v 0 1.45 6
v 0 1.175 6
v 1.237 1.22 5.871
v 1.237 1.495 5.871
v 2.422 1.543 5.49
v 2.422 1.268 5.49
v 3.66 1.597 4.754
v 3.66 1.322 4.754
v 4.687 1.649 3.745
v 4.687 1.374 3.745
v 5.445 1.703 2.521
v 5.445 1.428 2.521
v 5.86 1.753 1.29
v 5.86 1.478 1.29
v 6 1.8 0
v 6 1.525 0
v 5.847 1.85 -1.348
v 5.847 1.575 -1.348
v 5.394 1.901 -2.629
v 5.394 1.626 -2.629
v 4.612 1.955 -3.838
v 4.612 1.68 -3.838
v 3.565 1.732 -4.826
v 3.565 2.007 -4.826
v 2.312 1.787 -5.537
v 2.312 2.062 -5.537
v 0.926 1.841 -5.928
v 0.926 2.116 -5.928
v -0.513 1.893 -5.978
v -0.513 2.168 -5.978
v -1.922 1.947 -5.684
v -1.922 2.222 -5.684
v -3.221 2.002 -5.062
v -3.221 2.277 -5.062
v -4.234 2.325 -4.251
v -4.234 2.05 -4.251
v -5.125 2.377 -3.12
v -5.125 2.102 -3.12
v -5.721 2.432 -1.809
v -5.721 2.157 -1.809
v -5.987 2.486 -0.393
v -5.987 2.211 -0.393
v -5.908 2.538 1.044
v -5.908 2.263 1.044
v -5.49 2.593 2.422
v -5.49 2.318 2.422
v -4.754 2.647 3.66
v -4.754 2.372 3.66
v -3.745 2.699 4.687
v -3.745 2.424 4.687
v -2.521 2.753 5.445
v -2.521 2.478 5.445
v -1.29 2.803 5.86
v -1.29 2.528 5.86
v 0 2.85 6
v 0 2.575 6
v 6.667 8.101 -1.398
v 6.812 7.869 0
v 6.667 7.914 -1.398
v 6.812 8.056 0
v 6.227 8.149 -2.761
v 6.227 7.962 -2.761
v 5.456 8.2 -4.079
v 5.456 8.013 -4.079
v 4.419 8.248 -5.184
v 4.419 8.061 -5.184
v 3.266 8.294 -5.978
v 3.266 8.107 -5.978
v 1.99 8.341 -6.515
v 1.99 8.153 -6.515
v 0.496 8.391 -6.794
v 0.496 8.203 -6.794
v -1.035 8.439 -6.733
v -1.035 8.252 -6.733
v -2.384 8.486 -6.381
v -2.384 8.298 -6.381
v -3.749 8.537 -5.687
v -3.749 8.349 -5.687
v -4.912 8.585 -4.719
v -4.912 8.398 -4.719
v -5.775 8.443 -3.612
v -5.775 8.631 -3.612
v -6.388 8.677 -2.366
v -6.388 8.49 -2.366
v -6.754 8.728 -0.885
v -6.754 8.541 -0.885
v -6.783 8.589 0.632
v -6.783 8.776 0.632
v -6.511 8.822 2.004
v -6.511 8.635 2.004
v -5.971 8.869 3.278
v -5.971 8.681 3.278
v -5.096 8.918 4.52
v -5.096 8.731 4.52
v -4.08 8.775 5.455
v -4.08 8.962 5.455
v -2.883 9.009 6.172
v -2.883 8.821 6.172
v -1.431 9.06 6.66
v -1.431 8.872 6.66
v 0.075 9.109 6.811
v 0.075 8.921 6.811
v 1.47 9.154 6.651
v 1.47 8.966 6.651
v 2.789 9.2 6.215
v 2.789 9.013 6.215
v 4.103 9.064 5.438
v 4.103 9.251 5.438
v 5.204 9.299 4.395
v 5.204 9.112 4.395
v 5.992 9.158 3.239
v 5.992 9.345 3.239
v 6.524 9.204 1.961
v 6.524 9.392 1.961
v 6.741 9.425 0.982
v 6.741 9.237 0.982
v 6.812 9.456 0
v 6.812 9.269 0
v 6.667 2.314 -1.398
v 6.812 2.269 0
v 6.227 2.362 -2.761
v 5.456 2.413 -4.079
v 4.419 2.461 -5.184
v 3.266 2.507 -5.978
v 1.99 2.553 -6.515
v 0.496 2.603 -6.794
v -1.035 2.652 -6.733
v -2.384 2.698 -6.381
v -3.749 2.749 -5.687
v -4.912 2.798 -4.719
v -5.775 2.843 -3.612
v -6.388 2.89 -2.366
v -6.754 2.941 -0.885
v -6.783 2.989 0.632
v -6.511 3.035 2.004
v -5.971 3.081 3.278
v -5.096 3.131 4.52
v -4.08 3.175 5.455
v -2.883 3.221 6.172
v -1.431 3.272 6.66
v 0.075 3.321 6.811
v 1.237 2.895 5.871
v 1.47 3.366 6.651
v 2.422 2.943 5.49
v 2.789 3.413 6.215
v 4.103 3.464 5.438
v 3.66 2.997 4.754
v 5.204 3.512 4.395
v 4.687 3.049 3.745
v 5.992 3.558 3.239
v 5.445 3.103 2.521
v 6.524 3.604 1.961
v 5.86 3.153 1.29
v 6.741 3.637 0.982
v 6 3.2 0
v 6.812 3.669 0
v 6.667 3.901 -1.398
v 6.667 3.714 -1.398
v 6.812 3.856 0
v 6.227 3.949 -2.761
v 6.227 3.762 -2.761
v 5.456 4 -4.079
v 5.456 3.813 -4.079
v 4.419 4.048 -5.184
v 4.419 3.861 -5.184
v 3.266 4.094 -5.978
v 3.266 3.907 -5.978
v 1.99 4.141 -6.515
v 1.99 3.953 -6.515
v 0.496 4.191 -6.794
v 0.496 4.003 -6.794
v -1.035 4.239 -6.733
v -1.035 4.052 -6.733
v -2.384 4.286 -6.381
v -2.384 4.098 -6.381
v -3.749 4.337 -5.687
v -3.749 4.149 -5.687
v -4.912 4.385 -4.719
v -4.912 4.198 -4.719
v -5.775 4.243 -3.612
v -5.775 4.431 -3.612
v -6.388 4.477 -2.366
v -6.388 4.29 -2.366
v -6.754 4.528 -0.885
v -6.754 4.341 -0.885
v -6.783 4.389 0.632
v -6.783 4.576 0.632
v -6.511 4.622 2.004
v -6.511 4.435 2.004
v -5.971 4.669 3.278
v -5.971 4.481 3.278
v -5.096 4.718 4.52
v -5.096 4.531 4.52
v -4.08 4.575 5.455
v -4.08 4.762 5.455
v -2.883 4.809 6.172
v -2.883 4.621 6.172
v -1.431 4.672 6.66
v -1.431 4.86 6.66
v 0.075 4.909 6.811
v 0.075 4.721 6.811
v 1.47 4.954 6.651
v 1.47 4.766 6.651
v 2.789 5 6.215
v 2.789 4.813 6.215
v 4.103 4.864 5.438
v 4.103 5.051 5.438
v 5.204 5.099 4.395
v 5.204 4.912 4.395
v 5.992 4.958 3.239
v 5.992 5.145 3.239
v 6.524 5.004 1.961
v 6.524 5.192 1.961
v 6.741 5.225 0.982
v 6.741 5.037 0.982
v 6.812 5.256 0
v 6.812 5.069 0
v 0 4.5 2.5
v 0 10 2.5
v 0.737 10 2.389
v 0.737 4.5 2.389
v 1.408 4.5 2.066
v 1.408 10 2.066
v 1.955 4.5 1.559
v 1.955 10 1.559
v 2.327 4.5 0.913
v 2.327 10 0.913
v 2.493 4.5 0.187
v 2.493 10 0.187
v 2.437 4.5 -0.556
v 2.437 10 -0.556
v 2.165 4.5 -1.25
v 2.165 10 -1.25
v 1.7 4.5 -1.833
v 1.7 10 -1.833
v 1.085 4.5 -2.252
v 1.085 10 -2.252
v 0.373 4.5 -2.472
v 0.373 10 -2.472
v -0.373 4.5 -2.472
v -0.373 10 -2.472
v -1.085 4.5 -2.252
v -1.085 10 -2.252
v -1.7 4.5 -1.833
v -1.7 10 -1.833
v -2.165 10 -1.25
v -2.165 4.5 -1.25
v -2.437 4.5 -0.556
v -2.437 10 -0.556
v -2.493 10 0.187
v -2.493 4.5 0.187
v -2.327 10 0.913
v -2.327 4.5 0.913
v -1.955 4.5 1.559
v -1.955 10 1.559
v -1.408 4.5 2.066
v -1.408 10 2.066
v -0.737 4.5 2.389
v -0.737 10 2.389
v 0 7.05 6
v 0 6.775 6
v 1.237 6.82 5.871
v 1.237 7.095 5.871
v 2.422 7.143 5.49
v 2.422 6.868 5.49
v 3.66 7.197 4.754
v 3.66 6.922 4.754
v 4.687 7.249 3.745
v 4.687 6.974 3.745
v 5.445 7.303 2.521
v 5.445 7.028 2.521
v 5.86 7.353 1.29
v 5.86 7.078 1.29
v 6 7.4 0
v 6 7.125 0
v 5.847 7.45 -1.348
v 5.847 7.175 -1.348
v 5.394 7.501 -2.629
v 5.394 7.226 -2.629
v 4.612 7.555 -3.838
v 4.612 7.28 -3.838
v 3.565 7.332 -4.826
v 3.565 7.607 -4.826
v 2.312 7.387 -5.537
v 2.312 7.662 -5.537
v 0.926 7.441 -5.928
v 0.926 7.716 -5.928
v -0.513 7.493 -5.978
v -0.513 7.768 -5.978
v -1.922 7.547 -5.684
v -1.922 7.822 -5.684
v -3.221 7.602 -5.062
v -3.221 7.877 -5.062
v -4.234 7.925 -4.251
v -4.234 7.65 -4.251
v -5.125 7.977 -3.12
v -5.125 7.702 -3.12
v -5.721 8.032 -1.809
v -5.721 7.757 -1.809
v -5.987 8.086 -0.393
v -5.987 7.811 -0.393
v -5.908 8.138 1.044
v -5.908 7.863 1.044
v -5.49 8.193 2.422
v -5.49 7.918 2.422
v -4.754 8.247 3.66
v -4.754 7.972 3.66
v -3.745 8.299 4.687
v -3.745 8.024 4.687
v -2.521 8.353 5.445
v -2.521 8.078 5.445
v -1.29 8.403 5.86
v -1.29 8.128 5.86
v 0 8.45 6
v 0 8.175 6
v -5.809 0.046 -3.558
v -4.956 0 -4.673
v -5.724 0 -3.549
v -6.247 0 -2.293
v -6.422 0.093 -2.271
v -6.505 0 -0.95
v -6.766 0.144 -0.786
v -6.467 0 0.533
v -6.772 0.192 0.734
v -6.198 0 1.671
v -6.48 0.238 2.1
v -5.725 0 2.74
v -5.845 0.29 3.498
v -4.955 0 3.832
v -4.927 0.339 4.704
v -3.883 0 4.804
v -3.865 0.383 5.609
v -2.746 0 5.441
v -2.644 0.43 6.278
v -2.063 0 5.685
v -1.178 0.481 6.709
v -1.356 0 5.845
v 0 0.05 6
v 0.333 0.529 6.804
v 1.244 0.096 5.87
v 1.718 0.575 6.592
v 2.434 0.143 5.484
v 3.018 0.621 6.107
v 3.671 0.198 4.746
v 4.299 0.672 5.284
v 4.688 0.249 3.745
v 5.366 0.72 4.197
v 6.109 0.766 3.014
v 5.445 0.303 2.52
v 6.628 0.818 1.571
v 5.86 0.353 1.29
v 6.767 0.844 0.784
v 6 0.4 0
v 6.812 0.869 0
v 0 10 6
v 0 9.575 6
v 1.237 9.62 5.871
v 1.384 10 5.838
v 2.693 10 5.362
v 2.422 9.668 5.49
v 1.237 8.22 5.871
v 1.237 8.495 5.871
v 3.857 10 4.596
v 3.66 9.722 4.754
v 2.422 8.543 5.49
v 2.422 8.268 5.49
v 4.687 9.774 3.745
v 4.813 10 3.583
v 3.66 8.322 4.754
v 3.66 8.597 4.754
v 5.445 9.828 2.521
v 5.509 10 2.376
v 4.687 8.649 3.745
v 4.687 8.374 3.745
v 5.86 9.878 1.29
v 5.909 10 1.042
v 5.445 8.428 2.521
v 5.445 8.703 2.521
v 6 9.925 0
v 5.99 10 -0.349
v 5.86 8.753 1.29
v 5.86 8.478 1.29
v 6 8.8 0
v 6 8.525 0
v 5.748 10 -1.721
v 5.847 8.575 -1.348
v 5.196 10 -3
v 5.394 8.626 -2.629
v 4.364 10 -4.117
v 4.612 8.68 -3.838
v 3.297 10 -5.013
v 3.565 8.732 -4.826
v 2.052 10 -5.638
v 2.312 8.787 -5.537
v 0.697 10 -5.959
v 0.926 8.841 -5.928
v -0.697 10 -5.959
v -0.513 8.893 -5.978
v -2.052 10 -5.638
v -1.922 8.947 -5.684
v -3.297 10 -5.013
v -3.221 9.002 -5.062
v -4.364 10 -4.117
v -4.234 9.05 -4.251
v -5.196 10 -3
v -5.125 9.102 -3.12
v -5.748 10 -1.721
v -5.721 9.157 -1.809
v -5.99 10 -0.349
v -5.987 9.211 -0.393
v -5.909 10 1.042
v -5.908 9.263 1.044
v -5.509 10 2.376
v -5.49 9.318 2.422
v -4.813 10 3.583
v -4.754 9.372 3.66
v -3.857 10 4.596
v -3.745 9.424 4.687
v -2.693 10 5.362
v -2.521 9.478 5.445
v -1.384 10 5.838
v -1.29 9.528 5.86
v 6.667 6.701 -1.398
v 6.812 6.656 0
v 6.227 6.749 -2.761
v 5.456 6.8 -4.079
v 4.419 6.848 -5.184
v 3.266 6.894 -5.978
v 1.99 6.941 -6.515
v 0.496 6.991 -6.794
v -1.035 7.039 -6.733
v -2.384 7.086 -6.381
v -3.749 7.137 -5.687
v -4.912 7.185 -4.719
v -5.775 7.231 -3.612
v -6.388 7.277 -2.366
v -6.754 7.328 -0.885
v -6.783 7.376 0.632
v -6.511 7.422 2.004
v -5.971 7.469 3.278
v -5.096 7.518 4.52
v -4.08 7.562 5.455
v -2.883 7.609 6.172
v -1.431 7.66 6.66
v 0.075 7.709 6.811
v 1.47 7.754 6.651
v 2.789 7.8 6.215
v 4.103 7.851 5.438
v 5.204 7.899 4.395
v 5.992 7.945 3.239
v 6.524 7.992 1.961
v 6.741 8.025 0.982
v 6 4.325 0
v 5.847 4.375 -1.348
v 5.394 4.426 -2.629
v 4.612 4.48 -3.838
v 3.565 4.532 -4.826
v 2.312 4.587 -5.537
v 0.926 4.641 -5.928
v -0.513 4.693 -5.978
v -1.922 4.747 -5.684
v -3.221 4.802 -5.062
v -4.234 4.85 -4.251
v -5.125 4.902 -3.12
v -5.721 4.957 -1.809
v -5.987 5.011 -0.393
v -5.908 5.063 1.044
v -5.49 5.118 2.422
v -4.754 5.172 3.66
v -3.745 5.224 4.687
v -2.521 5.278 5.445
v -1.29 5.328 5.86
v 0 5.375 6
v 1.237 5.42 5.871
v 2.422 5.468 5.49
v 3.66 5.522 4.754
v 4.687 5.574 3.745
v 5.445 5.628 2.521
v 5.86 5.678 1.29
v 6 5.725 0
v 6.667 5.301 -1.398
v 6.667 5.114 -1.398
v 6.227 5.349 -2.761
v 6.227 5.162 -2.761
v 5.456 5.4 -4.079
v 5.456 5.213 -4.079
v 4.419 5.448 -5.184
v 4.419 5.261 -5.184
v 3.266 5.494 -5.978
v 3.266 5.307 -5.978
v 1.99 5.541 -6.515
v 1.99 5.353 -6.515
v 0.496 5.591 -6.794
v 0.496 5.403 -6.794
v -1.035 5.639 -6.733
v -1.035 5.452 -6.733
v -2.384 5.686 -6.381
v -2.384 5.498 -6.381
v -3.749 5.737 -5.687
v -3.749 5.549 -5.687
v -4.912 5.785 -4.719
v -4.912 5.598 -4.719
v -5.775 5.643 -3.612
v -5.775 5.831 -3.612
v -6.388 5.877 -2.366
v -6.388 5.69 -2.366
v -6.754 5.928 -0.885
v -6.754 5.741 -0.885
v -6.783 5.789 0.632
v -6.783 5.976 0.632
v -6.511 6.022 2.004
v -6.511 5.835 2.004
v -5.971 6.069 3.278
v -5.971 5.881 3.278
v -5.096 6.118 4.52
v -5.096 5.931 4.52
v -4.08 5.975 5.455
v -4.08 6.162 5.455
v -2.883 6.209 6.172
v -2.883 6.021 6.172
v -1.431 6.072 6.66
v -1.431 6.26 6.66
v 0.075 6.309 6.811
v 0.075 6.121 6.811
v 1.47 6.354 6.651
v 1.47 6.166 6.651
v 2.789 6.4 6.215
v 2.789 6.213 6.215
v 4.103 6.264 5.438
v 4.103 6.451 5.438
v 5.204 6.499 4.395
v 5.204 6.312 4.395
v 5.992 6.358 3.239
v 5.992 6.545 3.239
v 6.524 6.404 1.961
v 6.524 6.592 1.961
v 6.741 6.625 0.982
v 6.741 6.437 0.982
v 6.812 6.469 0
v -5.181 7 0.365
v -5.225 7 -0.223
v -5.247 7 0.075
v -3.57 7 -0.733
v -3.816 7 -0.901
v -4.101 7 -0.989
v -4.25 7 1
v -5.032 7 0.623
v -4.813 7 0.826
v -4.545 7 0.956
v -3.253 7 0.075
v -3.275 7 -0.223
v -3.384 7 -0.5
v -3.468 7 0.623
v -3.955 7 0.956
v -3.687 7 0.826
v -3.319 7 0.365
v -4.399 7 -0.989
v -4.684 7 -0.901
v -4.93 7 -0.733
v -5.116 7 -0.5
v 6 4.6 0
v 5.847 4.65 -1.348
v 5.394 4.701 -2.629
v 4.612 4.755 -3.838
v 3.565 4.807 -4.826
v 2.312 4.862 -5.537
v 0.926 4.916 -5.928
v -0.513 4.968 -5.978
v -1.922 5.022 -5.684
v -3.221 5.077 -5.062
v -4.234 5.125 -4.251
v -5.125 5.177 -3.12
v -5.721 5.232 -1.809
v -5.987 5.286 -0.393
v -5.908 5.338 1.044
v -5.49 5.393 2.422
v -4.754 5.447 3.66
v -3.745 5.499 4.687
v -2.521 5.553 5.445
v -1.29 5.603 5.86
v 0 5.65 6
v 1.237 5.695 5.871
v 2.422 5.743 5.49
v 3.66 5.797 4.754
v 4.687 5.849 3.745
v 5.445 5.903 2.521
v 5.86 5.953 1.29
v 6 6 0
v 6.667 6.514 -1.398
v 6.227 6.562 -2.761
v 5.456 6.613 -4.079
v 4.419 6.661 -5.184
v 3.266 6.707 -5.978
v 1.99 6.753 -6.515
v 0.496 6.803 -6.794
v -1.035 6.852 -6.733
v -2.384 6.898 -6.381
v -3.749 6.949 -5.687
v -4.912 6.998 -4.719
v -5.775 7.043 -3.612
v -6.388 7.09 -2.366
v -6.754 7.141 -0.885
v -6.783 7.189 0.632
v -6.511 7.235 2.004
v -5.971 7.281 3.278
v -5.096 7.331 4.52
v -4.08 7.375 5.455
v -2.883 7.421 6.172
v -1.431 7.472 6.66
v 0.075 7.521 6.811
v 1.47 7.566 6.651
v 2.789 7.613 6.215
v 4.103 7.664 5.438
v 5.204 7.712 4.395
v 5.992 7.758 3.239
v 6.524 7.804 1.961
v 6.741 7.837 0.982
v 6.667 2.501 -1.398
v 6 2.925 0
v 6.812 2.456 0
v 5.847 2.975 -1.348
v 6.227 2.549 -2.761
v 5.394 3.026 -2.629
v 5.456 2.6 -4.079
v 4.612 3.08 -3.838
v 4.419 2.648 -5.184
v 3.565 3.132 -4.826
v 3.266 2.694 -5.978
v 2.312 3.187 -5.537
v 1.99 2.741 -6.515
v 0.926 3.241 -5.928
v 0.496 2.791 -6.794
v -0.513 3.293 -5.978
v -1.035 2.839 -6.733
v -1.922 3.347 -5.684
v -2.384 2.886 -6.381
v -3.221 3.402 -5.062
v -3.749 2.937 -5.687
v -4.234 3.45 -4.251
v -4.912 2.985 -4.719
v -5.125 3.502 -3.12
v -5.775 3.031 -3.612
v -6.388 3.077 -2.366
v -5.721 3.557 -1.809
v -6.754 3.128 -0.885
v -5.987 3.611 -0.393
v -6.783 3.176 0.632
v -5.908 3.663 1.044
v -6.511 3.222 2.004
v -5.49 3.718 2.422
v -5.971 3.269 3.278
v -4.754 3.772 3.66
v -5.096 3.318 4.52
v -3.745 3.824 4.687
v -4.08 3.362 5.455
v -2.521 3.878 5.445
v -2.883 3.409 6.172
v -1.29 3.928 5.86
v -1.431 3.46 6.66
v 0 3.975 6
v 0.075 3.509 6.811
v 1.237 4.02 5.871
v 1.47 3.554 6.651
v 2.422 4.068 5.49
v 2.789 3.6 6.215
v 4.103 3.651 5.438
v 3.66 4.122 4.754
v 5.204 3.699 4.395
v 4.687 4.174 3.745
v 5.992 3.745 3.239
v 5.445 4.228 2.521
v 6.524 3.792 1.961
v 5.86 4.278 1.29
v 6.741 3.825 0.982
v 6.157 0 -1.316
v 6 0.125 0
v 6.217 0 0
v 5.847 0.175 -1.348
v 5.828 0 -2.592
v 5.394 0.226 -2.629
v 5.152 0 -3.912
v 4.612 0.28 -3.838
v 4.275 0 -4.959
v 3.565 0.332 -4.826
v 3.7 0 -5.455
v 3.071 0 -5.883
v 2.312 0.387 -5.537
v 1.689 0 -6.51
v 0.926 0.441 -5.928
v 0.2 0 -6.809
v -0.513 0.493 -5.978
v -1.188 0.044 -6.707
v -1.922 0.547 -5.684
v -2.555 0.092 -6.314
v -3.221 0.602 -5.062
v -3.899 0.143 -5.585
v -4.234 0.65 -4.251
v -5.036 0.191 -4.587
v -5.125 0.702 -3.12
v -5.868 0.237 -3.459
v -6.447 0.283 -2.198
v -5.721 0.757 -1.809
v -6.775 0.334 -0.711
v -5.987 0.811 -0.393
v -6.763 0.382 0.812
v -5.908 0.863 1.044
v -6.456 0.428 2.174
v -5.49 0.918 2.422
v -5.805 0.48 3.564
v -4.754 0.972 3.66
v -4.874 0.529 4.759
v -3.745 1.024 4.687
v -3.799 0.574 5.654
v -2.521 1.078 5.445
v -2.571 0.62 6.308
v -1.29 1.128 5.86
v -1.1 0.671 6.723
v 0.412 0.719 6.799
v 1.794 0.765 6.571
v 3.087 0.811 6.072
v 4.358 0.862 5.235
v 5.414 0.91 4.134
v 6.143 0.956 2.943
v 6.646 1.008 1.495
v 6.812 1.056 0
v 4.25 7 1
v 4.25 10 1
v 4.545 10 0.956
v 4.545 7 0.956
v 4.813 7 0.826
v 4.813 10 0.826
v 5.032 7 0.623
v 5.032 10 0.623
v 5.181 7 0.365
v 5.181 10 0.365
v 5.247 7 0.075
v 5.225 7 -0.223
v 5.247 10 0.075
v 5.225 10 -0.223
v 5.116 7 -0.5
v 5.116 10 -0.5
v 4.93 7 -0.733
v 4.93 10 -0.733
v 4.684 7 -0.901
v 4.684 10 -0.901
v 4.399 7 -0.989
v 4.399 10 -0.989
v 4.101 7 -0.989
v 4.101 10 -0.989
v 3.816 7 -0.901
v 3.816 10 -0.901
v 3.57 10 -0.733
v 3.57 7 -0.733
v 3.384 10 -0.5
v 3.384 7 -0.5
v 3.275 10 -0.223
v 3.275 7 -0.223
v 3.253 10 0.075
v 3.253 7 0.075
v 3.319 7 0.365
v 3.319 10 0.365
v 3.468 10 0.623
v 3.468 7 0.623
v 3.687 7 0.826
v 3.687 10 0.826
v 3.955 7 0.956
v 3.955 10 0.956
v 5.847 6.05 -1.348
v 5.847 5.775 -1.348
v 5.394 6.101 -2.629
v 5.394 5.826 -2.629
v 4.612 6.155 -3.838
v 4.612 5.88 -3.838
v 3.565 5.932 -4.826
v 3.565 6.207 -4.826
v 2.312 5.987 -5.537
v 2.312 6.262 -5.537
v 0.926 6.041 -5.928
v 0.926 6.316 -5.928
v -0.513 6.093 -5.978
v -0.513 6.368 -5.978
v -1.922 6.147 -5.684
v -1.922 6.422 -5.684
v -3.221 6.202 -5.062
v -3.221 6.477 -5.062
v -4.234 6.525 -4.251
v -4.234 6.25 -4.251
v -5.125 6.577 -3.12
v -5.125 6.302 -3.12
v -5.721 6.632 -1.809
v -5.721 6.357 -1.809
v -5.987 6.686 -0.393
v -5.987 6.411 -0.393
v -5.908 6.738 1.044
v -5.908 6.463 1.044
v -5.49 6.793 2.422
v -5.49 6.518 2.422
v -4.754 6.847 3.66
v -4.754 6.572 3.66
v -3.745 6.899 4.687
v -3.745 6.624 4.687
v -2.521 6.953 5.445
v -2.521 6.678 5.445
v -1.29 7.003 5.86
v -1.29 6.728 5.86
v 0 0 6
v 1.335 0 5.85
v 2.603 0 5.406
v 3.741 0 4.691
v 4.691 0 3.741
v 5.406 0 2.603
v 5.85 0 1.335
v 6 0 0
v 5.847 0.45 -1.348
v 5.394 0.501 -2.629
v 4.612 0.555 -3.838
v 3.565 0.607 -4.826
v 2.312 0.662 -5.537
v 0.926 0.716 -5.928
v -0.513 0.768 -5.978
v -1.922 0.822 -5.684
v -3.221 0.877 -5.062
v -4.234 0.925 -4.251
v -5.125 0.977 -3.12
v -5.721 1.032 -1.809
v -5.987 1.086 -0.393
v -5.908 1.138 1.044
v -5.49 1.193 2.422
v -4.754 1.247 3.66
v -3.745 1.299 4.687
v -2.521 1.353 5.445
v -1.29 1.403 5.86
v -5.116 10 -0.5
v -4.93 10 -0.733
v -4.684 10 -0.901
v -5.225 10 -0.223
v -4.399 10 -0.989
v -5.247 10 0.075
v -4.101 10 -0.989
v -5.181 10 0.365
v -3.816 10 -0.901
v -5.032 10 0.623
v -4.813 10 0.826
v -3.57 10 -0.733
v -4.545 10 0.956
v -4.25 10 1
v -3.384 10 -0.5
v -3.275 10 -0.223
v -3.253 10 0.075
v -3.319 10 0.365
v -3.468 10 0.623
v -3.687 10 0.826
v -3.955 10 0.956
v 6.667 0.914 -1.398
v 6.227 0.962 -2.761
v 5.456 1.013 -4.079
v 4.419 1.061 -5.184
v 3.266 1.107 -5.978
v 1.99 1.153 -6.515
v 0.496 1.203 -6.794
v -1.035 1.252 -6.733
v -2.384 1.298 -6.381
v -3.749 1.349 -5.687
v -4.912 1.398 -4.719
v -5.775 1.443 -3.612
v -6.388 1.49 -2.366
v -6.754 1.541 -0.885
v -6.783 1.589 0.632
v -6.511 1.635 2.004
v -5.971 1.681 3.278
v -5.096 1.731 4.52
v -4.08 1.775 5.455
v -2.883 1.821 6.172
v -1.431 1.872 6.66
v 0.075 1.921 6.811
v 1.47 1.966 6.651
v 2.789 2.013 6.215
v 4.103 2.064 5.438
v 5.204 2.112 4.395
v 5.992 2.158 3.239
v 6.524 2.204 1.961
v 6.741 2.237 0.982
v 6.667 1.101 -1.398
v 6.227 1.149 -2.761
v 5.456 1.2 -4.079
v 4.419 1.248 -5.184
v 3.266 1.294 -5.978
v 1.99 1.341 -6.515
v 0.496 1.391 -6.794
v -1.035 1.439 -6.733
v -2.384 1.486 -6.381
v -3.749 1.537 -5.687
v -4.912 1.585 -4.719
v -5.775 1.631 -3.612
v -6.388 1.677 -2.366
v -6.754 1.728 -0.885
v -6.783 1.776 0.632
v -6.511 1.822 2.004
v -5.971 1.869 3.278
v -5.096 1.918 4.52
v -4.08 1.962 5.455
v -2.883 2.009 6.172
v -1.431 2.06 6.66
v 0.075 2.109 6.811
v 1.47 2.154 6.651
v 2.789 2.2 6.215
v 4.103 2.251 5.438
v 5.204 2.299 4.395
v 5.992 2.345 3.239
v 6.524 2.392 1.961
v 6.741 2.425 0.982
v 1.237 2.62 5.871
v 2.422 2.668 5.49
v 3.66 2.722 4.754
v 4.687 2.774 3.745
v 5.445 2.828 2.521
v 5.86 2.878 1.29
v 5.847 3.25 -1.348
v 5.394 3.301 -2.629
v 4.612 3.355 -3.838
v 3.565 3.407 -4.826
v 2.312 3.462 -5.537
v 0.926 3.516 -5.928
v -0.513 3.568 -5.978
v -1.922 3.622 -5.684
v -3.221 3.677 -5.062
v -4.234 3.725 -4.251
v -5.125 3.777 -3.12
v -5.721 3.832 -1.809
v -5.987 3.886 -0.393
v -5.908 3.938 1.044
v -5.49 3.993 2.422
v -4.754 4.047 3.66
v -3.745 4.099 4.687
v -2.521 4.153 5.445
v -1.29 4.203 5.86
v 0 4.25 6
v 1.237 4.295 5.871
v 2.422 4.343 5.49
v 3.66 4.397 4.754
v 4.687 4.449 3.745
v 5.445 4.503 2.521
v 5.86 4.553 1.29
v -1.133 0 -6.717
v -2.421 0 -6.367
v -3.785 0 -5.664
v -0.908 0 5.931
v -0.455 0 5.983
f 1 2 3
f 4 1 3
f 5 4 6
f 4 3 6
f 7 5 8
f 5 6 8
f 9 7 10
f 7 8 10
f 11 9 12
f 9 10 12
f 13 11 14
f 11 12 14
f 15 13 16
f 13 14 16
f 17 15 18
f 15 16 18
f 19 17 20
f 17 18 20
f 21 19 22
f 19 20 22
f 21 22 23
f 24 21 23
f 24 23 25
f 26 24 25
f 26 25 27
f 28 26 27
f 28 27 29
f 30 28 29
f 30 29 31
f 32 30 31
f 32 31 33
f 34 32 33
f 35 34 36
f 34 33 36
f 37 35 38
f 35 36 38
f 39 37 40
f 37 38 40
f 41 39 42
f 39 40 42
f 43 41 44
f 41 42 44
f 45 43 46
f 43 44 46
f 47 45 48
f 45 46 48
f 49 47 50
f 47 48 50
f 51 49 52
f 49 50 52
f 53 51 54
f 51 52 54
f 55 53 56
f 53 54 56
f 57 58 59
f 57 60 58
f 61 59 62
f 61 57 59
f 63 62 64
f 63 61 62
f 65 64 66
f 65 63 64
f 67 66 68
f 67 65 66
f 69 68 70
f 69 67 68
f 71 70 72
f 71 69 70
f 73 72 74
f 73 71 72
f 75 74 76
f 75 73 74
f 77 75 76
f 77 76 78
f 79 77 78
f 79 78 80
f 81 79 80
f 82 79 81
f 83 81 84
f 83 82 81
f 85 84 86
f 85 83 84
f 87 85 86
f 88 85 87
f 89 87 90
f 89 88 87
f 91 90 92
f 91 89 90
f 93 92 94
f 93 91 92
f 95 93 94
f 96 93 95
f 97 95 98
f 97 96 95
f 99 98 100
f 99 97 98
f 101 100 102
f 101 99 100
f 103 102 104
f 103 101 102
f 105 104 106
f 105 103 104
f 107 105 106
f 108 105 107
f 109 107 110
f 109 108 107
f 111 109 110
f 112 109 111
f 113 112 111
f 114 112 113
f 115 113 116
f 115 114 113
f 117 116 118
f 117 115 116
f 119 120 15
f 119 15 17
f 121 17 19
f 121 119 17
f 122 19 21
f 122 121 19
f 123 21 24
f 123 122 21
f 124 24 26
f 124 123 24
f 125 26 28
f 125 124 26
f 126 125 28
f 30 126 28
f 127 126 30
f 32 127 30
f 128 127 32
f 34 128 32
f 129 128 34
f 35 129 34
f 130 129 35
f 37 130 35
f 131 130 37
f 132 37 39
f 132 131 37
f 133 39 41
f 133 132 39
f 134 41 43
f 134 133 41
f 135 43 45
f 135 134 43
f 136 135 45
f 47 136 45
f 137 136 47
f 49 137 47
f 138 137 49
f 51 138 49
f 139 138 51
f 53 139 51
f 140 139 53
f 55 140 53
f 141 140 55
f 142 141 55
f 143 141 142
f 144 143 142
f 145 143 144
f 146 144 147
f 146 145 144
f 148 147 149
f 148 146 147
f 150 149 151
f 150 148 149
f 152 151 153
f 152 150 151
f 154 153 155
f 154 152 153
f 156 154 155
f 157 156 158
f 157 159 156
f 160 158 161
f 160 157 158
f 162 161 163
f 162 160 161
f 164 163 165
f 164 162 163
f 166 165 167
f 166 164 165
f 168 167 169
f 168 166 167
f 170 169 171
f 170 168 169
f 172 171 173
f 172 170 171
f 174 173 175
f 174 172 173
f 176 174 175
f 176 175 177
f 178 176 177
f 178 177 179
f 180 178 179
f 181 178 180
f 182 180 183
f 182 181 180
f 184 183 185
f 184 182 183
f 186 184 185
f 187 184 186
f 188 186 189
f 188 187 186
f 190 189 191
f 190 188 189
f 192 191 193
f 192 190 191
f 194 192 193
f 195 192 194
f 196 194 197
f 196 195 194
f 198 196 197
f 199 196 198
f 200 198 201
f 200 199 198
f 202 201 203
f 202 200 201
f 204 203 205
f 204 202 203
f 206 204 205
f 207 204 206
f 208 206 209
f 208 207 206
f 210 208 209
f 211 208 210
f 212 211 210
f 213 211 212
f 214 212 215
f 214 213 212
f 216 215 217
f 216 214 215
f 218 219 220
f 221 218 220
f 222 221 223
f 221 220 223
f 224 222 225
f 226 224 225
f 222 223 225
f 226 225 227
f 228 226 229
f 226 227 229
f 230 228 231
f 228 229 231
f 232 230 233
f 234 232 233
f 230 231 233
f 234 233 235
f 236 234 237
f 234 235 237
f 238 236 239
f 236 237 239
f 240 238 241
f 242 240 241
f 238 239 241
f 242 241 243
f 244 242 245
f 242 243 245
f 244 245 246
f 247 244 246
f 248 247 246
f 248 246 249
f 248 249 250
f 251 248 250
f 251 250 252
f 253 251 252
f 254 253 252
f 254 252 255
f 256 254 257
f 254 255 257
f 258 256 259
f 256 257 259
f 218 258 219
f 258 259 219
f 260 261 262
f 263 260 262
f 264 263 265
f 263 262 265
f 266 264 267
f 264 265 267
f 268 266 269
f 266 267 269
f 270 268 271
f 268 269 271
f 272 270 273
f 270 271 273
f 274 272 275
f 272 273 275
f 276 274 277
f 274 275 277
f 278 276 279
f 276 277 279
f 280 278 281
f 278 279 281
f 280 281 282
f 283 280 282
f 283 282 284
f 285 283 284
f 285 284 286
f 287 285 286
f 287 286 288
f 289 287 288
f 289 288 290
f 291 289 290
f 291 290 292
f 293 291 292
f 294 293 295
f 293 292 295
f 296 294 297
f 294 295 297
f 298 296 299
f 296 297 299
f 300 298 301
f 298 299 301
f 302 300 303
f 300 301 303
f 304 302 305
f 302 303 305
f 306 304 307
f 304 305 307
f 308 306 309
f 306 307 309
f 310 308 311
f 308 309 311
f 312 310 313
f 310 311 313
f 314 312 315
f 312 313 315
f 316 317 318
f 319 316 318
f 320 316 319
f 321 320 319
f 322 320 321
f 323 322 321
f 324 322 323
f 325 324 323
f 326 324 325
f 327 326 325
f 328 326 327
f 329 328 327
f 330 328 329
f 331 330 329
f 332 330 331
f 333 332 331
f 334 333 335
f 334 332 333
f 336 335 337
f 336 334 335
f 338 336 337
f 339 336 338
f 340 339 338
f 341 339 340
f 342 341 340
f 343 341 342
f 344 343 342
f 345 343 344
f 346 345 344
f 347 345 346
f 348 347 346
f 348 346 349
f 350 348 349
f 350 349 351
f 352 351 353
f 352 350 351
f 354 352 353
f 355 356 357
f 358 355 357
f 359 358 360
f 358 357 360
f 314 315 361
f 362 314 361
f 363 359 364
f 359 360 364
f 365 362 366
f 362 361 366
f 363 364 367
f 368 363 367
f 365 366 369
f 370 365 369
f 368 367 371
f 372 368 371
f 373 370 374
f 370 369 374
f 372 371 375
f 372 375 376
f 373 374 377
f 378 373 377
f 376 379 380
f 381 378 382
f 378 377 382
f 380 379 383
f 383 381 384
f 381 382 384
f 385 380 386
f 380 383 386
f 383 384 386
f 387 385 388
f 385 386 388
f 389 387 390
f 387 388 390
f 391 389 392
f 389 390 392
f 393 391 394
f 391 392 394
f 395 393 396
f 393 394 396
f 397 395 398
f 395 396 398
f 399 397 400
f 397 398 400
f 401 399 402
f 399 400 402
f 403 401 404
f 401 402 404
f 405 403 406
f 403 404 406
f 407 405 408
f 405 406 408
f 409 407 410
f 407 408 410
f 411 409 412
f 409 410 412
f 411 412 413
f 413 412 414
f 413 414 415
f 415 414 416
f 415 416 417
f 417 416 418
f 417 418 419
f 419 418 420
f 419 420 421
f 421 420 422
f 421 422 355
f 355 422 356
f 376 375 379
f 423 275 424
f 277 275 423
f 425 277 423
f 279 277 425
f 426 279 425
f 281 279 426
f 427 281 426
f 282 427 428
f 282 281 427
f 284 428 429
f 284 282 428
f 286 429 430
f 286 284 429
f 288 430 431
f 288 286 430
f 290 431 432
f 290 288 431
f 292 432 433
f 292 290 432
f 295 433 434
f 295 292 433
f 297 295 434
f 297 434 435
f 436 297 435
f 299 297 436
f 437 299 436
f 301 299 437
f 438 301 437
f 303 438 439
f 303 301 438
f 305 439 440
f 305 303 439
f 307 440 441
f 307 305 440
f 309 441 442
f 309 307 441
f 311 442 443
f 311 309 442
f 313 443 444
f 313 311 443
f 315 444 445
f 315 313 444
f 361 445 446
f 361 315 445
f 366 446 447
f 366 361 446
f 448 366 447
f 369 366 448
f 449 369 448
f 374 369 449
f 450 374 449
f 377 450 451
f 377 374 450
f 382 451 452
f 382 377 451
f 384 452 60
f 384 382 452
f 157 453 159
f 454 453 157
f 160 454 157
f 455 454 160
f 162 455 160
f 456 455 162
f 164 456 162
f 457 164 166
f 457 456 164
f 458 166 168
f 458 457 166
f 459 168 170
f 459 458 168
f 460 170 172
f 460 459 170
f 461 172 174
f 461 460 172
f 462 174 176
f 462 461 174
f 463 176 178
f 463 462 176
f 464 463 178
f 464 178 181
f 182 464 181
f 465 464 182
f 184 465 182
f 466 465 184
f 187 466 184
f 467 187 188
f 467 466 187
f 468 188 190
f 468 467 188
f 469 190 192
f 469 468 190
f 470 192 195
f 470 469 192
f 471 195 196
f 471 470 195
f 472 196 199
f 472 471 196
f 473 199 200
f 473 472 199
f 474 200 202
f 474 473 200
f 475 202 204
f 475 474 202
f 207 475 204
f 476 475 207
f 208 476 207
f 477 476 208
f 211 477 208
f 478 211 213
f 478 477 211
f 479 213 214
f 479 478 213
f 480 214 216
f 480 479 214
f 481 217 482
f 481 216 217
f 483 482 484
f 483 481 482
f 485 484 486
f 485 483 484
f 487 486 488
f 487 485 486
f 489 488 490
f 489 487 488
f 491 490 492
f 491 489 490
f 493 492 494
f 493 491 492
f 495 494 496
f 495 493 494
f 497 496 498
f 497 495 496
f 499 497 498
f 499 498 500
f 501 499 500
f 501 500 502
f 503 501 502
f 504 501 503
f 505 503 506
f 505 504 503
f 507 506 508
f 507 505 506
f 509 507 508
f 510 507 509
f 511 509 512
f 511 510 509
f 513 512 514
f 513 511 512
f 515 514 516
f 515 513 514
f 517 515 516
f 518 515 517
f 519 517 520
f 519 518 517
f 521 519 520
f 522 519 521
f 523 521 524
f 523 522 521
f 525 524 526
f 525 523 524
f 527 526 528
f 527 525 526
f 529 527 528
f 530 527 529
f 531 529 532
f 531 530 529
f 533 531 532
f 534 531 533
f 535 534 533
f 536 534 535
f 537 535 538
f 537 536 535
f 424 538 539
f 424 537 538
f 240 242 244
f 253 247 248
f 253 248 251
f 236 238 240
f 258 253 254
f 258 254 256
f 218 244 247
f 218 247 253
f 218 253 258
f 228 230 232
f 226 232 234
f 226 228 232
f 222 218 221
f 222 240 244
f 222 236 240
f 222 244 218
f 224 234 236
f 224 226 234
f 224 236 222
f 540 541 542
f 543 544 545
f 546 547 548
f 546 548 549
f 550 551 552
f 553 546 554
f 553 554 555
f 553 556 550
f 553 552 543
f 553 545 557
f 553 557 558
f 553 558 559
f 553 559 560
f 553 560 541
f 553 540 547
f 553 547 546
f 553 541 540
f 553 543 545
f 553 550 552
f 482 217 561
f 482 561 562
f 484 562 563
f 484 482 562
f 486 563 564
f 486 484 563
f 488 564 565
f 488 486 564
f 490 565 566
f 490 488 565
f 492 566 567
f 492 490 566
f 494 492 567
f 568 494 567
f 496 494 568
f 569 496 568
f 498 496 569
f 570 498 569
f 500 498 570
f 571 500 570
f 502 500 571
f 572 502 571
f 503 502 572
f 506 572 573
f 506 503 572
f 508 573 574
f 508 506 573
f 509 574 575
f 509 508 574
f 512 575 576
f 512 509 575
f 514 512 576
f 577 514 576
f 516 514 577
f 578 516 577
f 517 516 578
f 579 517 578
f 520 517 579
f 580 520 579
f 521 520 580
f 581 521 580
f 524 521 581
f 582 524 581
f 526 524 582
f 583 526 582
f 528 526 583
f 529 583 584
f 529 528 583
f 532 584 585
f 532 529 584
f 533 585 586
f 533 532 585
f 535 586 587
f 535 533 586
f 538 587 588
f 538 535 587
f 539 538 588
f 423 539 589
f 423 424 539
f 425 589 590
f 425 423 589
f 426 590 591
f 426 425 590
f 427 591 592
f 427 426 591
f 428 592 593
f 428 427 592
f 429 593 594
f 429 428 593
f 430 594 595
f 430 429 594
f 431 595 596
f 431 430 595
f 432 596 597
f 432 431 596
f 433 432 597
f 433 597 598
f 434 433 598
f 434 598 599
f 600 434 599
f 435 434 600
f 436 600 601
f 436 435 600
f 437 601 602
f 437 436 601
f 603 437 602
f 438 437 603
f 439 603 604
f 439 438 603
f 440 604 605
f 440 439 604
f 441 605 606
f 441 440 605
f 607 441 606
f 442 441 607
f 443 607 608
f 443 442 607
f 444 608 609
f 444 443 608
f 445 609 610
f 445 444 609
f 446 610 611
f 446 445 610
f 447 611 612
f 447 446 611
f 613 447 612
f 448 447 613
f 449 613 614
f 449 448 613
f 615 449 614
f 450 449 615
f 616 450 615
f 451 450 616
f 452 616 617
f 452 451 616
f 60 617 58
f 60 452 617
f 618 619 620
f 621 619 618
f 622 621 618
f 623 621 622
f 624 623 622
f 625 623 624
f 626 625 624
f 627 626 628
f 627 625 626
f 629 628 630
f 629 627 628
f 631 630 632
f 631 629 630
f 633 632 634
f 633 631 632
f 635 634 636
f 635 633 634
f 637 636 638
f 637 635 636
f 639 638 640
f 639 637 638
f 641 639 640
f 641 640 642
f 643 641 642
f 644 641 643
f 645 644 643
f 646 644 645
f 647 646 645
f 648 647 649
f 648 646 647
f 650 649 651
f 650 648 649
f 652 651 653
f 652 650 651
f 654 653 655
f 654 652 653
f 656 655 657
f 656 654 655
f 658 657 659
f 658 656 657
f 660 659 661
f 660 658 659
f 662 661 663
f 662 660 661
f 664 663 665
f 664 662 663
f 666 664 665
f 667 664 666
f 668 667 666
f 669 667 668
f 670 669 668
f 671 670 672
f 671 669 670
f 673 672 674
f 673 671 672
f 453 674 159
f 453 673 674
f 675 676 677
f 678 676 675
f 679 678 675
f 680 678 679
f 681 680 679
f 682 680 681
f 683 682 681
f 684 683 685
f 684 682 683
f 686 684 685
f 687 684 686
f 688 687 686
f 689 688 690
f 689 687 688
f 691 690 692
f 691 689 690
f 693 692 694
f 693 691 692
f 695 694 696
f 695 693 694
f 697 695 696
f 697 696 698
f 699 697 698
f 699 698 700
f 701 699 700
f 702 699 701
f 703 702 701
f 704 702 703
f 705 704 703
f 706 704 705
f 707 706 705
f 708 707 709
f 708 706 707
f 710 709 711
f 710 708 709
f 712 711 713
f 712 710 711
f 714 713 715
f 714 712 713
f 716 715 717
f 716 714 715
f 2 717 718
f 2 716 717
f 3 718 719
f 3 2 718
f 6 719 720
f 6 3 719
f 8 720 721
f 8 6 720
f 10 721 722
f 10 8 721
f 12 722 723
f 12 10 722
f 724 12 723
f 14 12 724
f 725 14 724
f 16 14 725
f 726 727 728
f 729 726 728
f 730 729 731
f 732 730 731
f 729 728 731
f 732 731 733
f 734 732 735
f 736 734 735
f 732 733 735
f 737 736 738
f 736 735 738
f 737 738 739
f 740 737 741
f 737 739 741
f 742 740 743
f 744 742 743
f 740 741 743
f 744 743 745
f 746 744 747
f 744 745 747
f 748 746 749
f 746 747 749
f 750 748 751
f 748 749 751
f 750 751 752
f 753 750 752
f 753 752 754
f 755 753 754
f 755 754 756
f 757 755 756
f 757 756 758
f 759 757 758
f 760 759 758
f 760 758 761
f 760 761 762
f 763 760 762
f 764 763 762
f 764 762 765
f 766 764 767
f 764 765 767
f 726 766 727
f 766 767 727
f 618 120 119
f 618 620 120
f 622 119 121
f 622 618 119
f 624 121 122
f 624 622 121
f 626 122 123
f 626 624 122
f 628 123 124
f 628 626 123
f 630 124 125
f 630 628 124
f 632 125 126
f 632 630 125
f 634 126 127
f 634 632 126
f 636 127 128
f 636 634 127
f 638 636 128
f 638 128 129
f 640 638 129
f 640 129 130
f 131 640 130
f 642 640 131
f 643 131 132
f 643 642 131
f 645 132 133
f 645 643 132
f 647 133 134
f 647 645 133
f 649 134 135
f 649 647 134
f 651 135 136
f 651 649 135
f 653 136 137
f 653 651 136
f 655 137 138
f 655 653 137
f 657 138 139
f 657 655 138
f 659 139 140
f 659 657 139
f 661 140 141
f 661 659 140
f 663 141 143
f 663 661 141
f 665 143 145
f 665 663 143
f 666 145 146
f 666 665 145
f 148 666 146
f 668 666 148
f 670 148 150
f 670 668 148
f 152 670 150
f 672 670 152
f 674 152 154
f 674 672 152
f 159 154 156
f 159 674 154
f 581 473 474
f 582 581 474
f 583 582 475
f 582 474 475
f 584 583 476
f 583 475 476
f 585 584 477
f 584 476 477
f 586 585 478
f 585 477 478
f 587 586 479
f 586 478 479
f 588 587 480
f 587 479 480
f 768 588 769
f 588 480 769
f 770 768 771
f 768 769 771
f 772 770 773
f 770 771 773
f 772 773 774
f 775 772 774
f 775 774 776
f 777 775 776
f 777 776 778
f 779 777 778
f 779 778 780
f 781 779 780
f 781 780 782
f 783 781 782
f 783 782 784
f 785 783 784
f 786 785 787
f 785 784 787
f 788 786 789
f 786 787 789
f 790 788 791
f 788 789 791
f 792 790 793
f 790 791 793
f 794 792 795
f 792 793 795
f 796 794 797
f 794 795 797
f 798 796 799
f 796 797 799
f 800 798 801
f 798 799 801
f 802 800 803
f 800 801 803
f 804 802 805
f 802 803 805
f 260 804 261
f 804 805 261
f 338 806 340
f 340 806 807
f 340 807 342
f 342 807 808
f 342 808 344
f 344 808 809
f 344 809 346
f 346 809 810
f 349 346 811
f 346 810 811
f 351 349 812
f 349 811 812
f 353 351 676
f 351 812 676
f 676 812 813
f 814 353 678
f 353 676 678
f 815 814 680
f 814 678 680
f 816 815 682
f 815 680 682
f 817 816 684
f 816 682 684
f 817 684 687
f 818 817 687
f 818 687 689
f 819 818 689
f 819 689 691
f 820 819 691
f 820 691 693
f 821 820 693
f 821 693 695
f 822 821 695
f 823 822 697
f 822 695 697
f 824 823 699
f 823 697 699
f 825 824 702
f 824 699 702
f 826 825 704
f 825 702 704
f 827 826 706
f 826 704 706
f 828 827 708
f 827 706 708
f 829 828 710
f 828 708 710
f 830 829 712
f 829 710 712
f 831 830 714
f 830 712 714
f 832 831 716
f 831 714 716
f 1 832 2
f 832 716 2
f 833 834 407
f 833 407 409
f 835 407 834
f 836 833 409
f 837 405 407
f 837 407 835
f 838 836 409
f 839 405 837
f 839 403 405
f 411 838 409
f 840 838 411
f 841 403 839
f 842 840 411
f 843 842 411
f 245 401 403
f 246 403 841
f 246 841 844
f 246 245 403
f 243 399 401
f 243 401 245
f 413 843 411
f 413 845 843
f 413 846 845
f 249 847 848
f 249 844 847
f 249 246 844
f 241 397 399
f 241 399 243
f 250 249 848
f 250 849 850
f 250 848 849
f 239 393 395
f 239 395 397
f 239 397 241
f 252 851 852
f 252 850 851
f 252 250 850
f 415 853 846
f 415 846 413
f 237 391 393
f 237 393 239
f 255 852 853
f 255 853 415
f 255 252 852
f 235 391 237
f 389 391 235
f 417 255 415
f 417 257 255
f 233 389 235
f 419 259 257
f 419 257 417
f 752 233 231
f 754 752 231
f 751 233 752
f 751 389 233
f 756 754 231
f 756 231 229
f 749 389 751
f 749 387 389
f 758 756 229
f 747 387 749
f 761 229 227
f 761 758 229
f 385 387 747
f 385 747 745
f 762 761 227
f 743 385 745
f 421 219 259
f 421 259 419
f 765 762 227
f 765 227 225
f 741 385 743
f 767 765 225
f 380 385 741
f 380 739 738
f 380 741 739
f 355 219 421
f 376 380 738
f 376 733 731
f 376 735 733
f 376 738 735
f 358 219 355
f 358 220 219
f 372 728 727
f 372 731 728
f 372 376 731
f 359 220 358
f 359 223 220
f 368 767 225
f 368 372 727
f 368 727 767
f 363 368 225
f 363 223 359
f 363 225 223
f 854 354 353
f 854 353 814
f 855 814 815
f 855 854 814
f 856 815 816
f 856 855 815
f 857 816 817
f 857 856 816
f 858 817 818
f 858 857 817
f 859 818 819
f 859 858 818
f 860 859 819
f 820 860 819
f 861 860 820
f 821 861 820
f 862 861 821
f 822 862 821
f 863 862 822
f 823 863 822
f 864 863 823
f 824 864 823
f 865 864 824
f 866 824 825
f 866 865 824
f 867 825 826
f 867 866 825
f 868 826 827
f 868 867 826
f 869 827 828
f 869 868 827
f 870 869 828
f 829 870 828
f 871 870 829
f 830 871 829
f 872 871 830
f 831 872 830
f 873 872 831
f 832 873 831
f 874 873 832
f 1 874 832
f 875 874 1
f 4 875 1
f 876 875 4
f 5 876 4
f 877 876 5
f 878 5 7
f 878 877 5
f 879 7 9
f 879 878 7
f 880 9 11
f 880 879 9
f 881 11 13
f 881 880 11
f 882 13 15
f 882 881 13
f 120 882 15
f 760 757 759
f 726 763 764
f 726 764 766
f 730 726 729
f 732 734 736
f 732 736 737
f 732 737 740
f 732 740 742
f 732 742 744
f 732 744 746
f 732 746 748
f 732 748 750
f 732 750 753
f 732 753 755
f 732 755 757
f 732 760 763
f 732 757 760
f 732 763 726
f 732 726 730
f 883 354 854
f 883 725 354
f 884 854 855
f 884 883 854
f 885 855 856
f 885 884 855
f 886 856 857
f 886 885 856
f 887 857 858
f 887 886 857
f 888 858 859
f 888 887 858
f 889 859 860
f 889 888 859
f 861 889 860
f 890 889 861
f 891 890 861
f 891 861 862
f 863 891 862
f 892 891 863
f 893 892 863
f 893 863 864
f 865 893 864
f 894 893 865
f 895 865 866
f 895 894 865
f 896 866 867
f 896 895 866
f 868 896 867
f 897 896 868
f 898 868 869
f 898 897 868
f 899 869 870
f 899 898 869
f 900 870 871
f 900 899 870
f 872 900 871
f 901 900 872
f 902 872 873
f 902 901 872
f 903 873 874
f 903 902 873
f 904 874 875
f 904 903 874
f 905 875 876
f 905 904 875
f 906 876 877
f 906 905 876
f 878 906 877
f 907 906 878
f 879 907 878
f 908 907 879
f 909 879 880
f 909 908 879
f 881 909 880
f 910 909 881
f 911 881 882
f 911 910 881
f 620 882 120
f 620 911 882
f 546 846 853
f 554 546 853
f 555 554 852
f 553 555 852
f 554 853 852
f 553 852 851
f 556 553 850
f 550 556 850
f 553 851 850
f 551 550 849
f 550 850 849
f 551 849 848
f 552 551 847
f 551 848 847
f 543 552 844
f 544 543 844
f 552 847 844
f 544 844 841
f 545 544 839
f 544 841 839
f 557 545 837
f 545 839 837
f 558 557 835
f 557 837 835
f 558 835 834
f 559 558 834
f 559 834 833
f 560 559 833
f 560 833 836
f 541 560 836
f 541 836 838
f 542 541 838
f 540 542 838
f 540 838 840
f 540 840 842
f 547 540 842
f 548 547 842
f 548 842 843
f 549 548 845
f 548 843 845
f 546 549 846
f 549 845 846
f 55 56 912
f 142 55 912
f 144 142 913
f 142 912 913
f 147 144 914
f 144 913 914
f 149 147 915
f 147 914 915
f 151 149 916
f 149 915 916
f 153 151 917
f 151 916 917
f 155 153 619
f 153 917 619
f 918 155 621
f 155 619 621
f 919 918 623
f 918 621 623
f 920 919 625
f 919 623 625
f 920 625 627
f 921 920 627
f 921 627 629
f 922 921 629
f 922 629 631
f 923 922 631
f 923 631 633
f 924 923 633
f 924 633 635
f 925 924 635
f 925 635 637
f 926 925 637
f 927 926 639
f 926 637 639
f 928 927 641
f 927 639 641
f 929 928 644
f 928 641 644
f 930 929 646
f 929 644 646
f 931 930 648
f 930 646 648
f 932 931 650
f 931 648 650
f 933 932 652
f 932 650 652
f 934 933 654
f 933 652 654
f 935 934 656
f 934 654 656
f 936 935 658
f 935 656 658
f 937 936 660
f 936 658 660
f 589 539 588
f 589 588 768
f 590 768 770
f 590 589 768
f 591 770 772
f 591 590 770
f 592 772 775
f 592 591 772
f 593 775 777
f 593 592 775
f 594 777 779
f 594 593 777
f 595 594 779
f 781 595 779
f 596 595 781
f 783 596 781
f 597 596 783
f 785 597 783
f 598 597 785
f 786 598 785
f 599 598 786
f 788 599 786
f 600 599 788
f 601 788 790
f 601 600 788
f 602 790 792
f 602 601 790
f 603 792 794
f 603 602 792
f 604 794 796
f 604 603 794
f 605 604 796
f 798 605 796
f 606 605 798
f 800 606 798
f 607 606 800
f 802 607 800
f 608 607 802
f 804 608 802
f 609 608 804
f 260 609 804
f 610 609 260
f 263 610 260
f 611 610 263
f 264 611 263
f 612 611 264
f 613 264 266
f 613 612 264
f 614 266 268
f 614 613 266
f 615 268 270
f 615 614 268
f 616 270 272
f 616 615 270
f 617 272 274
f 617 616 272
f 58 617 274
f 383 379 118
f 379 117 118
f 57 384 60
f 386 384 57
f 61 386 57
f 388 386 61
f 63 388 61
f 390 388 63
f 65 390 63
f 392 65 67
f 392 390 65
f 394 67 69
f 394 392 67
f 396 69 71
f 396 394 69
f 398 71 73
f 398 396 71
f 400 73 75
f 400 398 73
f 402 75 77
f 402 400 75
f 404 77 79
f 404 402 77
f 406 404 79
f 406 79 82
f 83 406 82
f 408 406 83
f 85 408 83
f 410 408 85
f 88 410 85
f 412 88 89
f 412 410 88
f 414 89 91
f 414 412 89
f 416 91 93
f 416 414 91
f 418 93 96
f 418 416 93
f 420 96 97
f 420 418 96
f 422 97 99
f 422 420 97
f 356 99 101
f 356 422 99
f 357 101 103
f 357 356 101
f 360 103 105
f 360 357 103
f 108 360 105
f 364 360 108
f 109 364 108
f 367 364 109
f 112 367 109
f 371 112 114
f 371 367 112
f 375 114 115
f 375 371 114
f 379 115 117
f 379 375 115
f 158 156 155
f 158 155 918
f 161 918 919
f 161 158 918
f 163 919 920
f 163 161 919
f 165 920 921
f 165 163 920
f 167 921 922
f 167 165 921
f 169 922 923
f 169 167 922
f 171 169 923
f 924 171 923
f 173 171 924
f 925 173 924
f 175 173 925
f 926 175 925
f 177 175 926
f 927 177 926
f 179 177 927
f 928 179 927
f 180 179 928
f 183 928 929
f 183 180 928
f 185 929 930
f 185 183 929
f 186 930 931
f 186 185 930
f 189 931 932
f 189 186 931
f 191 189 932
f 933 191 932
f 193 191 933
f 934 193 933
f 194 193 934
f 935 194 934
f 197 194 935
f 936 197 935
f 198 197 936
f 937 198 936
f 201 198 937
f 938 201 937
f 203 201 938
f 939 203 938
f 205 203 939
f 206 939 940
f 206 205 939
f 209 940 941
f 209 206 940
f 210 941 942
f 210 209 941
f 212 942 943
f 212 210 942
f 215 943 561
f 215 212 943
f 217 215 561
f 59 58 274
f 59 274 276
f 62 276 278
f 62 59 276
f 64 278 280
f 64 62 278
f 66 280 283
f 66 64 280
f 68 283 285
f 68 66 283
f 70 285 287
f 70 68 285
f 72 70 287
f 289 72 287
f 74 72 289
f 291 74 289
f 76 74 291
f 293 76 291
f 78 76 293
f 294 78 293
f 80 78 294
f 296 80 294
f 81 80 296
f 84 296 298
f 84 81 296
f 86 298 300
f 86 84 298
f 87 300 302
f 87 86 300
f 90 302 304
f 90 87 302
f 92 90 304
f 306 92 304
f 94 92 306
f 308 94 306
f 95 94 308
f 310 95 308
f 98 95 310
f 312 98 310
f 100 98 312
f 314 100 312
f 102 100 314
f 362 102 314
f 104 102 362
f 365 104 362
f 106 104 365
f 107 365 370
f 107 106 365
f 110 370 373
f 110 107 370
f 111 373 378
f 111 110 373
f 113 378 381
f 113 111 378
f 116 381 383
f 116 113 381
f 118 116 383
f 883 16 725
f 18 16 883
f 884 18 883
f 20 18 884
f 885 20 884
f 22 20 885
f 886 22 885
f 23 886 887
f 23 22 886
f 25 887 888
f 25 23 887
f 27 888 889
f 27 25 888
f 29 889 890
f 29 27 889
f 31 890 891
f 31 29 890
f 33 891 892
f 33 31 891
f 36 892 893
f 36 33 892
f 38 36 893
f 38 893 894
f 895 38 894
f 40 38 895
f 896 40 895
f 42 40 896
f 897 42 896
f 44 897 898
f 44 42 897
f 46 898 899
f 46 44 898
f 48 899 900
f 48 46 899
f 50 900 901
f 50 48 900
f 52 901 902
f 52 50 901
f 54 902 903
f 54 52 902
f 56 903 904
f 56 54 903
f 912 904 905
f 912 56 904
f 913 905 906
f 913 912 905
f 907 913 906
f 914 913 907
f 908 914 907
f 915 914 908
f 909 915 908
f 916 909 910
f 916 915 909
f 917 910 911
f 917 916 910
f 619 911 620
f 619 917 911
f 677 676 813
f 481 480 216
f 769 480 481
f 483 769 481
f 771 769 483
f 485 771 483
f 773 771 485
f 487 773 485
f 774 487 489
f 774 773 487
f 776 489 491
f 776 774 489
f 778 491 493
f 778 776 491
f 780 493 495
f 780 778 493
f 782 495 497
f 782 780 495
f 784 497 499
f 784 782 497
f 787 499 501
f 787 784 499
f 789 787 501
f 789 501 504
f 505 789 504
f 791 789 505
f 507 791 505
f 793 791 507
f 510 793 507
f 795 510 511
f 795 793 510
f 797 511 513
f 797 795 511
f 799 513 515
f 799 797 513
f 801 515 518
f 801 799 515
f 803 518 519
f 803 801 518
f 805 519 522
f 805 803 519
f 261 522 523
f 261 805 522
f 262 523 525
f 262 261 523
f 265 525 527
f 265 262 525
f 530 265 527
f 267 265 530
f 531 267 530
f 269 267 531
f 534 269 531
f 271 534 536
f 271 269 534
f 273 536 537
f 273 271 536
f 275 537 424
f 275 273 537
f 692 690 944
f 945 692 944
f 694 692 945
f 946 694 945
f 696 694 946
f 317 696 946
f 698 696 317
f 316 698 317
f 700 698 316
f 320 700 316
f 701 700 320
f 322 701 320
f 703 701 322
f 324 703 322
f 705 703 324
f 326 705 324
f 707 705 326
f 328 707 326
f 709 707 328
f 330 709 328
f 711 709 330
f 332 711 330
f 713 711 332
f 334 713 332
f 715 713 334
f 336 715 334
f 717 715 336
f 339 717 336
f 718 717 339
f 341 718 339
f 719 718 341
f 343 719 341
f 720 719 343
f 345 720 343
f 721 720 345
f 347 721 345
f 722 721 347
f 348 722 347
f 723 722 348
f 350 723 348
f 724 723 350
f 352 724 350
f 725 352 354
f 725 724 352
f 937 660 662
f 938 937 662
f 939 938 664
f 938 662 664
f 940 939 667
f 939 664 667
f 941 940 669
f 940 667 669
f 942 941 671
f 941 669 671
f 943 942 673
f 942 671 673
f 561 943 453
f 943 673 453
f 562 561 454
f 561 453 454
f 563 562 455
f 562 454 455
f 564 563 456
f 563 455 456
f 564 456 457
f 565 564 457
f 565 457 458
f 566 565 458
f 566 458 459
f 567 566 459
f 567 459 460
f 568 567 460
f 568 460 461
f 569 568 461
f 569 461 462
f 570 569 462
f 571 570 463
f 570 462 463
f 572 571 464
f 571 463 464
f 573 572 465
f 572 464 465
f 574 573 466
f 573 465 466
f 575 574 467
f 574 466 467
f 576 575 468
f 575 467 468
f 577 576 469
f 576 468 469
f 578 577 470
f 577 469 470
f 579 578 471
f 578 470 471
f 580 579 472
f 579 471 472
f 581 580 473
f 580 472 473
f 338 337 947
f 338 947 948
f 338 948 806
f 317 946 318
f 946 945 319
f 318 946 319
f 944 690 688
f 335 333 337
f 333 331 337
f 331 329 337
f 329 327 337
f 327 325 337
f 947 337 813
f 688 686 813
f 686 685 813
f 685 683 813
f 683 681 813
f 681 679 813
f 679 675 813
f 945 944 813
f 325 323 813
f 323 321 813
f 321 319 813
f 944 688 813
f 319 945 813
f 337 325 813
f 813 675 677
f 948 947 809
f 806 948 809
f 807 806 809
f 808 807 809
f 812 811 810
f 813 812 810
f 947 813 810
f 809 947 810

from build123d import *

# Parameters (mm, degrees)
ESQUISSE1_R             = 6
BOSS_EXTRU_1_DEPTH      = 10
FILETAGE1_PITCH         = 1.4
FILETAGE1_FROM          = 1
ESQUISSE23_R            = 2.5
ENL_V_MAT_EXTRU_1_DEPTH = 5.5
ESQUISSE24_R            = 1
ENL_V_MAT_EXTRU_2_DEPTH = 3


with BuildPart() as part:
    # Esquisse1 → Boss.-Extru.1 (new body)
    with BuildSketch(Plane(origin=(0, 0, 0), x_dir=(1, 0, 0), z_dir=(0, 1, 0))):
        with Locations(Location((0, 0, 0), (0, 0, 270))):
            Circle(ESQUISSE1_R)
    extrude(amount=BOSS_EXTRU_1_DEPTH)

    # Filetage1: arcs per turn and ends read off the stored shape
    # Filetage1: the profile of Profil de filetage2 profile screwed along a right-hand helix through 7 turns, 8 arcs to a turn; built about Z, then put on its axis
    filetage1_z = Axis((0, 0, 0), (0, 0, 1))
    filetage1_corners = [(5.9997, 0, -0.000173205), (6.811898812, 0, 0.468749998), (6.811898812, 0, 0.656249998), (5.9997, 0, 1.125173201)]
    with BuildLine(mode=Mode.PRIVATE) as filetage1_profile:
        Line(filetage1_corners[0], filetage1_corners[1])
        Line(filetage1_corners[1], filetage1_corners[2])
        Line(filetage1_corners[2], filetage1_corners[3])
        Line(filetage1_corners[3], filetage1_corners[0])
    filetage1_cap = Face(filetage1_profile.wire())
    filetage1_turn_angles = [0, 22.5, 45, 67.5, 90, 112.5, 135, 157.5, 180, 202.5, 225, 247.5, 270, 292.5, 315, 337.5, 360]
    filetage1_turn_weights = [1, 0.9238795325112867, 1, 0.9238795325112867, 1, 0.9238795325112867, 1, 0.9238795325112867, 1, 0.9238795325112867, 1, 0.9238795325112867, 1, 0.9238795325112867, 1, 0.9238795325112867, 1]
    filetage1_turn_rails = [Edge.make_bspline([Vector(p[0], p[1], 0).rotate(filetage1_z, filetage1_turn_angles[k]) / filetage1_turn_weights[k] + Vector(0, 0, p[2] + FILETAGE1_PITCH * filetage1_turn_angles[k] / 360) for k in range(17)], [0, 0, 0, 1, 1, 2, 2, 3, 3, 4, 4, 5, 5, 6, 6, 7, 7, 8, 8, 8], 2, filetage1_turn_weights) for p in filetage1_corners]
    filetage1_turn_sides = [Face.make_surface_from_curves(filetage1_turn_rails[p[0]], filetage1_turn_rails[p[1]]) for p in [(0, 1), (1, 2), (2, 3), (3, 0)]]
    filetage1 = Plane(origin=(0, -1, 0), x_dir=(1, 0, 0), z_dir=(0, 1, 0)) * split(Solid(Shell([*[p.moved(Location((0, 0, FILETAGE1_PITCH * i))) for i in range(7) for p in filetage1_turn_sides], filetage1_cap, filetage1_cap.rotate(filetage1_z, 2520).moved(Location((0, 0, FILETAGE1_PITCH * 2520 / 360)))])), bisect_by=Plane.XY.offset(FILETAGE1_FROM), keep=Keep.TOP, mode=Mode.PRIVATE)
    add(filetage1)

    # Esquisse23 → Enlèv. mat.-Extru.1 (cut)
    with BuildSketch(Plane(origin=(0, 10, 0), x_dir=(1, 0, 0), z_dir=(0, 1, 0))):
        with Locations(Location((0, 0, 0), (0, 0, 270))):
            Circle(ESQUISSE23_R)
    extrude(amount=-ENL_V_MAT_EXTRU_1_DEPTH, mode=Mode.SUBTRACT)

    # Esquisse24 → Enlèv. mat.-Extru.2 (cut)
    with BuildSketch(Plane(origin=(0, 10, 0), x_dir=(1, 0, 0), z_dir=(0, 1, 0))):
        with Locations(Location((4.25, 0, 0), (0, 0, 270))):
            Circle(ESQUISSE24_R)
        with Locations(Location((-4.25, 0, 0), (0, 0, 270))):
            Circle(ESQUISSE24_R)
    extrude(amount=-ENL_V_MAT_EXTRU_2_DEPTH, mode=Mode.SUBTRACT)


solid = part.part
